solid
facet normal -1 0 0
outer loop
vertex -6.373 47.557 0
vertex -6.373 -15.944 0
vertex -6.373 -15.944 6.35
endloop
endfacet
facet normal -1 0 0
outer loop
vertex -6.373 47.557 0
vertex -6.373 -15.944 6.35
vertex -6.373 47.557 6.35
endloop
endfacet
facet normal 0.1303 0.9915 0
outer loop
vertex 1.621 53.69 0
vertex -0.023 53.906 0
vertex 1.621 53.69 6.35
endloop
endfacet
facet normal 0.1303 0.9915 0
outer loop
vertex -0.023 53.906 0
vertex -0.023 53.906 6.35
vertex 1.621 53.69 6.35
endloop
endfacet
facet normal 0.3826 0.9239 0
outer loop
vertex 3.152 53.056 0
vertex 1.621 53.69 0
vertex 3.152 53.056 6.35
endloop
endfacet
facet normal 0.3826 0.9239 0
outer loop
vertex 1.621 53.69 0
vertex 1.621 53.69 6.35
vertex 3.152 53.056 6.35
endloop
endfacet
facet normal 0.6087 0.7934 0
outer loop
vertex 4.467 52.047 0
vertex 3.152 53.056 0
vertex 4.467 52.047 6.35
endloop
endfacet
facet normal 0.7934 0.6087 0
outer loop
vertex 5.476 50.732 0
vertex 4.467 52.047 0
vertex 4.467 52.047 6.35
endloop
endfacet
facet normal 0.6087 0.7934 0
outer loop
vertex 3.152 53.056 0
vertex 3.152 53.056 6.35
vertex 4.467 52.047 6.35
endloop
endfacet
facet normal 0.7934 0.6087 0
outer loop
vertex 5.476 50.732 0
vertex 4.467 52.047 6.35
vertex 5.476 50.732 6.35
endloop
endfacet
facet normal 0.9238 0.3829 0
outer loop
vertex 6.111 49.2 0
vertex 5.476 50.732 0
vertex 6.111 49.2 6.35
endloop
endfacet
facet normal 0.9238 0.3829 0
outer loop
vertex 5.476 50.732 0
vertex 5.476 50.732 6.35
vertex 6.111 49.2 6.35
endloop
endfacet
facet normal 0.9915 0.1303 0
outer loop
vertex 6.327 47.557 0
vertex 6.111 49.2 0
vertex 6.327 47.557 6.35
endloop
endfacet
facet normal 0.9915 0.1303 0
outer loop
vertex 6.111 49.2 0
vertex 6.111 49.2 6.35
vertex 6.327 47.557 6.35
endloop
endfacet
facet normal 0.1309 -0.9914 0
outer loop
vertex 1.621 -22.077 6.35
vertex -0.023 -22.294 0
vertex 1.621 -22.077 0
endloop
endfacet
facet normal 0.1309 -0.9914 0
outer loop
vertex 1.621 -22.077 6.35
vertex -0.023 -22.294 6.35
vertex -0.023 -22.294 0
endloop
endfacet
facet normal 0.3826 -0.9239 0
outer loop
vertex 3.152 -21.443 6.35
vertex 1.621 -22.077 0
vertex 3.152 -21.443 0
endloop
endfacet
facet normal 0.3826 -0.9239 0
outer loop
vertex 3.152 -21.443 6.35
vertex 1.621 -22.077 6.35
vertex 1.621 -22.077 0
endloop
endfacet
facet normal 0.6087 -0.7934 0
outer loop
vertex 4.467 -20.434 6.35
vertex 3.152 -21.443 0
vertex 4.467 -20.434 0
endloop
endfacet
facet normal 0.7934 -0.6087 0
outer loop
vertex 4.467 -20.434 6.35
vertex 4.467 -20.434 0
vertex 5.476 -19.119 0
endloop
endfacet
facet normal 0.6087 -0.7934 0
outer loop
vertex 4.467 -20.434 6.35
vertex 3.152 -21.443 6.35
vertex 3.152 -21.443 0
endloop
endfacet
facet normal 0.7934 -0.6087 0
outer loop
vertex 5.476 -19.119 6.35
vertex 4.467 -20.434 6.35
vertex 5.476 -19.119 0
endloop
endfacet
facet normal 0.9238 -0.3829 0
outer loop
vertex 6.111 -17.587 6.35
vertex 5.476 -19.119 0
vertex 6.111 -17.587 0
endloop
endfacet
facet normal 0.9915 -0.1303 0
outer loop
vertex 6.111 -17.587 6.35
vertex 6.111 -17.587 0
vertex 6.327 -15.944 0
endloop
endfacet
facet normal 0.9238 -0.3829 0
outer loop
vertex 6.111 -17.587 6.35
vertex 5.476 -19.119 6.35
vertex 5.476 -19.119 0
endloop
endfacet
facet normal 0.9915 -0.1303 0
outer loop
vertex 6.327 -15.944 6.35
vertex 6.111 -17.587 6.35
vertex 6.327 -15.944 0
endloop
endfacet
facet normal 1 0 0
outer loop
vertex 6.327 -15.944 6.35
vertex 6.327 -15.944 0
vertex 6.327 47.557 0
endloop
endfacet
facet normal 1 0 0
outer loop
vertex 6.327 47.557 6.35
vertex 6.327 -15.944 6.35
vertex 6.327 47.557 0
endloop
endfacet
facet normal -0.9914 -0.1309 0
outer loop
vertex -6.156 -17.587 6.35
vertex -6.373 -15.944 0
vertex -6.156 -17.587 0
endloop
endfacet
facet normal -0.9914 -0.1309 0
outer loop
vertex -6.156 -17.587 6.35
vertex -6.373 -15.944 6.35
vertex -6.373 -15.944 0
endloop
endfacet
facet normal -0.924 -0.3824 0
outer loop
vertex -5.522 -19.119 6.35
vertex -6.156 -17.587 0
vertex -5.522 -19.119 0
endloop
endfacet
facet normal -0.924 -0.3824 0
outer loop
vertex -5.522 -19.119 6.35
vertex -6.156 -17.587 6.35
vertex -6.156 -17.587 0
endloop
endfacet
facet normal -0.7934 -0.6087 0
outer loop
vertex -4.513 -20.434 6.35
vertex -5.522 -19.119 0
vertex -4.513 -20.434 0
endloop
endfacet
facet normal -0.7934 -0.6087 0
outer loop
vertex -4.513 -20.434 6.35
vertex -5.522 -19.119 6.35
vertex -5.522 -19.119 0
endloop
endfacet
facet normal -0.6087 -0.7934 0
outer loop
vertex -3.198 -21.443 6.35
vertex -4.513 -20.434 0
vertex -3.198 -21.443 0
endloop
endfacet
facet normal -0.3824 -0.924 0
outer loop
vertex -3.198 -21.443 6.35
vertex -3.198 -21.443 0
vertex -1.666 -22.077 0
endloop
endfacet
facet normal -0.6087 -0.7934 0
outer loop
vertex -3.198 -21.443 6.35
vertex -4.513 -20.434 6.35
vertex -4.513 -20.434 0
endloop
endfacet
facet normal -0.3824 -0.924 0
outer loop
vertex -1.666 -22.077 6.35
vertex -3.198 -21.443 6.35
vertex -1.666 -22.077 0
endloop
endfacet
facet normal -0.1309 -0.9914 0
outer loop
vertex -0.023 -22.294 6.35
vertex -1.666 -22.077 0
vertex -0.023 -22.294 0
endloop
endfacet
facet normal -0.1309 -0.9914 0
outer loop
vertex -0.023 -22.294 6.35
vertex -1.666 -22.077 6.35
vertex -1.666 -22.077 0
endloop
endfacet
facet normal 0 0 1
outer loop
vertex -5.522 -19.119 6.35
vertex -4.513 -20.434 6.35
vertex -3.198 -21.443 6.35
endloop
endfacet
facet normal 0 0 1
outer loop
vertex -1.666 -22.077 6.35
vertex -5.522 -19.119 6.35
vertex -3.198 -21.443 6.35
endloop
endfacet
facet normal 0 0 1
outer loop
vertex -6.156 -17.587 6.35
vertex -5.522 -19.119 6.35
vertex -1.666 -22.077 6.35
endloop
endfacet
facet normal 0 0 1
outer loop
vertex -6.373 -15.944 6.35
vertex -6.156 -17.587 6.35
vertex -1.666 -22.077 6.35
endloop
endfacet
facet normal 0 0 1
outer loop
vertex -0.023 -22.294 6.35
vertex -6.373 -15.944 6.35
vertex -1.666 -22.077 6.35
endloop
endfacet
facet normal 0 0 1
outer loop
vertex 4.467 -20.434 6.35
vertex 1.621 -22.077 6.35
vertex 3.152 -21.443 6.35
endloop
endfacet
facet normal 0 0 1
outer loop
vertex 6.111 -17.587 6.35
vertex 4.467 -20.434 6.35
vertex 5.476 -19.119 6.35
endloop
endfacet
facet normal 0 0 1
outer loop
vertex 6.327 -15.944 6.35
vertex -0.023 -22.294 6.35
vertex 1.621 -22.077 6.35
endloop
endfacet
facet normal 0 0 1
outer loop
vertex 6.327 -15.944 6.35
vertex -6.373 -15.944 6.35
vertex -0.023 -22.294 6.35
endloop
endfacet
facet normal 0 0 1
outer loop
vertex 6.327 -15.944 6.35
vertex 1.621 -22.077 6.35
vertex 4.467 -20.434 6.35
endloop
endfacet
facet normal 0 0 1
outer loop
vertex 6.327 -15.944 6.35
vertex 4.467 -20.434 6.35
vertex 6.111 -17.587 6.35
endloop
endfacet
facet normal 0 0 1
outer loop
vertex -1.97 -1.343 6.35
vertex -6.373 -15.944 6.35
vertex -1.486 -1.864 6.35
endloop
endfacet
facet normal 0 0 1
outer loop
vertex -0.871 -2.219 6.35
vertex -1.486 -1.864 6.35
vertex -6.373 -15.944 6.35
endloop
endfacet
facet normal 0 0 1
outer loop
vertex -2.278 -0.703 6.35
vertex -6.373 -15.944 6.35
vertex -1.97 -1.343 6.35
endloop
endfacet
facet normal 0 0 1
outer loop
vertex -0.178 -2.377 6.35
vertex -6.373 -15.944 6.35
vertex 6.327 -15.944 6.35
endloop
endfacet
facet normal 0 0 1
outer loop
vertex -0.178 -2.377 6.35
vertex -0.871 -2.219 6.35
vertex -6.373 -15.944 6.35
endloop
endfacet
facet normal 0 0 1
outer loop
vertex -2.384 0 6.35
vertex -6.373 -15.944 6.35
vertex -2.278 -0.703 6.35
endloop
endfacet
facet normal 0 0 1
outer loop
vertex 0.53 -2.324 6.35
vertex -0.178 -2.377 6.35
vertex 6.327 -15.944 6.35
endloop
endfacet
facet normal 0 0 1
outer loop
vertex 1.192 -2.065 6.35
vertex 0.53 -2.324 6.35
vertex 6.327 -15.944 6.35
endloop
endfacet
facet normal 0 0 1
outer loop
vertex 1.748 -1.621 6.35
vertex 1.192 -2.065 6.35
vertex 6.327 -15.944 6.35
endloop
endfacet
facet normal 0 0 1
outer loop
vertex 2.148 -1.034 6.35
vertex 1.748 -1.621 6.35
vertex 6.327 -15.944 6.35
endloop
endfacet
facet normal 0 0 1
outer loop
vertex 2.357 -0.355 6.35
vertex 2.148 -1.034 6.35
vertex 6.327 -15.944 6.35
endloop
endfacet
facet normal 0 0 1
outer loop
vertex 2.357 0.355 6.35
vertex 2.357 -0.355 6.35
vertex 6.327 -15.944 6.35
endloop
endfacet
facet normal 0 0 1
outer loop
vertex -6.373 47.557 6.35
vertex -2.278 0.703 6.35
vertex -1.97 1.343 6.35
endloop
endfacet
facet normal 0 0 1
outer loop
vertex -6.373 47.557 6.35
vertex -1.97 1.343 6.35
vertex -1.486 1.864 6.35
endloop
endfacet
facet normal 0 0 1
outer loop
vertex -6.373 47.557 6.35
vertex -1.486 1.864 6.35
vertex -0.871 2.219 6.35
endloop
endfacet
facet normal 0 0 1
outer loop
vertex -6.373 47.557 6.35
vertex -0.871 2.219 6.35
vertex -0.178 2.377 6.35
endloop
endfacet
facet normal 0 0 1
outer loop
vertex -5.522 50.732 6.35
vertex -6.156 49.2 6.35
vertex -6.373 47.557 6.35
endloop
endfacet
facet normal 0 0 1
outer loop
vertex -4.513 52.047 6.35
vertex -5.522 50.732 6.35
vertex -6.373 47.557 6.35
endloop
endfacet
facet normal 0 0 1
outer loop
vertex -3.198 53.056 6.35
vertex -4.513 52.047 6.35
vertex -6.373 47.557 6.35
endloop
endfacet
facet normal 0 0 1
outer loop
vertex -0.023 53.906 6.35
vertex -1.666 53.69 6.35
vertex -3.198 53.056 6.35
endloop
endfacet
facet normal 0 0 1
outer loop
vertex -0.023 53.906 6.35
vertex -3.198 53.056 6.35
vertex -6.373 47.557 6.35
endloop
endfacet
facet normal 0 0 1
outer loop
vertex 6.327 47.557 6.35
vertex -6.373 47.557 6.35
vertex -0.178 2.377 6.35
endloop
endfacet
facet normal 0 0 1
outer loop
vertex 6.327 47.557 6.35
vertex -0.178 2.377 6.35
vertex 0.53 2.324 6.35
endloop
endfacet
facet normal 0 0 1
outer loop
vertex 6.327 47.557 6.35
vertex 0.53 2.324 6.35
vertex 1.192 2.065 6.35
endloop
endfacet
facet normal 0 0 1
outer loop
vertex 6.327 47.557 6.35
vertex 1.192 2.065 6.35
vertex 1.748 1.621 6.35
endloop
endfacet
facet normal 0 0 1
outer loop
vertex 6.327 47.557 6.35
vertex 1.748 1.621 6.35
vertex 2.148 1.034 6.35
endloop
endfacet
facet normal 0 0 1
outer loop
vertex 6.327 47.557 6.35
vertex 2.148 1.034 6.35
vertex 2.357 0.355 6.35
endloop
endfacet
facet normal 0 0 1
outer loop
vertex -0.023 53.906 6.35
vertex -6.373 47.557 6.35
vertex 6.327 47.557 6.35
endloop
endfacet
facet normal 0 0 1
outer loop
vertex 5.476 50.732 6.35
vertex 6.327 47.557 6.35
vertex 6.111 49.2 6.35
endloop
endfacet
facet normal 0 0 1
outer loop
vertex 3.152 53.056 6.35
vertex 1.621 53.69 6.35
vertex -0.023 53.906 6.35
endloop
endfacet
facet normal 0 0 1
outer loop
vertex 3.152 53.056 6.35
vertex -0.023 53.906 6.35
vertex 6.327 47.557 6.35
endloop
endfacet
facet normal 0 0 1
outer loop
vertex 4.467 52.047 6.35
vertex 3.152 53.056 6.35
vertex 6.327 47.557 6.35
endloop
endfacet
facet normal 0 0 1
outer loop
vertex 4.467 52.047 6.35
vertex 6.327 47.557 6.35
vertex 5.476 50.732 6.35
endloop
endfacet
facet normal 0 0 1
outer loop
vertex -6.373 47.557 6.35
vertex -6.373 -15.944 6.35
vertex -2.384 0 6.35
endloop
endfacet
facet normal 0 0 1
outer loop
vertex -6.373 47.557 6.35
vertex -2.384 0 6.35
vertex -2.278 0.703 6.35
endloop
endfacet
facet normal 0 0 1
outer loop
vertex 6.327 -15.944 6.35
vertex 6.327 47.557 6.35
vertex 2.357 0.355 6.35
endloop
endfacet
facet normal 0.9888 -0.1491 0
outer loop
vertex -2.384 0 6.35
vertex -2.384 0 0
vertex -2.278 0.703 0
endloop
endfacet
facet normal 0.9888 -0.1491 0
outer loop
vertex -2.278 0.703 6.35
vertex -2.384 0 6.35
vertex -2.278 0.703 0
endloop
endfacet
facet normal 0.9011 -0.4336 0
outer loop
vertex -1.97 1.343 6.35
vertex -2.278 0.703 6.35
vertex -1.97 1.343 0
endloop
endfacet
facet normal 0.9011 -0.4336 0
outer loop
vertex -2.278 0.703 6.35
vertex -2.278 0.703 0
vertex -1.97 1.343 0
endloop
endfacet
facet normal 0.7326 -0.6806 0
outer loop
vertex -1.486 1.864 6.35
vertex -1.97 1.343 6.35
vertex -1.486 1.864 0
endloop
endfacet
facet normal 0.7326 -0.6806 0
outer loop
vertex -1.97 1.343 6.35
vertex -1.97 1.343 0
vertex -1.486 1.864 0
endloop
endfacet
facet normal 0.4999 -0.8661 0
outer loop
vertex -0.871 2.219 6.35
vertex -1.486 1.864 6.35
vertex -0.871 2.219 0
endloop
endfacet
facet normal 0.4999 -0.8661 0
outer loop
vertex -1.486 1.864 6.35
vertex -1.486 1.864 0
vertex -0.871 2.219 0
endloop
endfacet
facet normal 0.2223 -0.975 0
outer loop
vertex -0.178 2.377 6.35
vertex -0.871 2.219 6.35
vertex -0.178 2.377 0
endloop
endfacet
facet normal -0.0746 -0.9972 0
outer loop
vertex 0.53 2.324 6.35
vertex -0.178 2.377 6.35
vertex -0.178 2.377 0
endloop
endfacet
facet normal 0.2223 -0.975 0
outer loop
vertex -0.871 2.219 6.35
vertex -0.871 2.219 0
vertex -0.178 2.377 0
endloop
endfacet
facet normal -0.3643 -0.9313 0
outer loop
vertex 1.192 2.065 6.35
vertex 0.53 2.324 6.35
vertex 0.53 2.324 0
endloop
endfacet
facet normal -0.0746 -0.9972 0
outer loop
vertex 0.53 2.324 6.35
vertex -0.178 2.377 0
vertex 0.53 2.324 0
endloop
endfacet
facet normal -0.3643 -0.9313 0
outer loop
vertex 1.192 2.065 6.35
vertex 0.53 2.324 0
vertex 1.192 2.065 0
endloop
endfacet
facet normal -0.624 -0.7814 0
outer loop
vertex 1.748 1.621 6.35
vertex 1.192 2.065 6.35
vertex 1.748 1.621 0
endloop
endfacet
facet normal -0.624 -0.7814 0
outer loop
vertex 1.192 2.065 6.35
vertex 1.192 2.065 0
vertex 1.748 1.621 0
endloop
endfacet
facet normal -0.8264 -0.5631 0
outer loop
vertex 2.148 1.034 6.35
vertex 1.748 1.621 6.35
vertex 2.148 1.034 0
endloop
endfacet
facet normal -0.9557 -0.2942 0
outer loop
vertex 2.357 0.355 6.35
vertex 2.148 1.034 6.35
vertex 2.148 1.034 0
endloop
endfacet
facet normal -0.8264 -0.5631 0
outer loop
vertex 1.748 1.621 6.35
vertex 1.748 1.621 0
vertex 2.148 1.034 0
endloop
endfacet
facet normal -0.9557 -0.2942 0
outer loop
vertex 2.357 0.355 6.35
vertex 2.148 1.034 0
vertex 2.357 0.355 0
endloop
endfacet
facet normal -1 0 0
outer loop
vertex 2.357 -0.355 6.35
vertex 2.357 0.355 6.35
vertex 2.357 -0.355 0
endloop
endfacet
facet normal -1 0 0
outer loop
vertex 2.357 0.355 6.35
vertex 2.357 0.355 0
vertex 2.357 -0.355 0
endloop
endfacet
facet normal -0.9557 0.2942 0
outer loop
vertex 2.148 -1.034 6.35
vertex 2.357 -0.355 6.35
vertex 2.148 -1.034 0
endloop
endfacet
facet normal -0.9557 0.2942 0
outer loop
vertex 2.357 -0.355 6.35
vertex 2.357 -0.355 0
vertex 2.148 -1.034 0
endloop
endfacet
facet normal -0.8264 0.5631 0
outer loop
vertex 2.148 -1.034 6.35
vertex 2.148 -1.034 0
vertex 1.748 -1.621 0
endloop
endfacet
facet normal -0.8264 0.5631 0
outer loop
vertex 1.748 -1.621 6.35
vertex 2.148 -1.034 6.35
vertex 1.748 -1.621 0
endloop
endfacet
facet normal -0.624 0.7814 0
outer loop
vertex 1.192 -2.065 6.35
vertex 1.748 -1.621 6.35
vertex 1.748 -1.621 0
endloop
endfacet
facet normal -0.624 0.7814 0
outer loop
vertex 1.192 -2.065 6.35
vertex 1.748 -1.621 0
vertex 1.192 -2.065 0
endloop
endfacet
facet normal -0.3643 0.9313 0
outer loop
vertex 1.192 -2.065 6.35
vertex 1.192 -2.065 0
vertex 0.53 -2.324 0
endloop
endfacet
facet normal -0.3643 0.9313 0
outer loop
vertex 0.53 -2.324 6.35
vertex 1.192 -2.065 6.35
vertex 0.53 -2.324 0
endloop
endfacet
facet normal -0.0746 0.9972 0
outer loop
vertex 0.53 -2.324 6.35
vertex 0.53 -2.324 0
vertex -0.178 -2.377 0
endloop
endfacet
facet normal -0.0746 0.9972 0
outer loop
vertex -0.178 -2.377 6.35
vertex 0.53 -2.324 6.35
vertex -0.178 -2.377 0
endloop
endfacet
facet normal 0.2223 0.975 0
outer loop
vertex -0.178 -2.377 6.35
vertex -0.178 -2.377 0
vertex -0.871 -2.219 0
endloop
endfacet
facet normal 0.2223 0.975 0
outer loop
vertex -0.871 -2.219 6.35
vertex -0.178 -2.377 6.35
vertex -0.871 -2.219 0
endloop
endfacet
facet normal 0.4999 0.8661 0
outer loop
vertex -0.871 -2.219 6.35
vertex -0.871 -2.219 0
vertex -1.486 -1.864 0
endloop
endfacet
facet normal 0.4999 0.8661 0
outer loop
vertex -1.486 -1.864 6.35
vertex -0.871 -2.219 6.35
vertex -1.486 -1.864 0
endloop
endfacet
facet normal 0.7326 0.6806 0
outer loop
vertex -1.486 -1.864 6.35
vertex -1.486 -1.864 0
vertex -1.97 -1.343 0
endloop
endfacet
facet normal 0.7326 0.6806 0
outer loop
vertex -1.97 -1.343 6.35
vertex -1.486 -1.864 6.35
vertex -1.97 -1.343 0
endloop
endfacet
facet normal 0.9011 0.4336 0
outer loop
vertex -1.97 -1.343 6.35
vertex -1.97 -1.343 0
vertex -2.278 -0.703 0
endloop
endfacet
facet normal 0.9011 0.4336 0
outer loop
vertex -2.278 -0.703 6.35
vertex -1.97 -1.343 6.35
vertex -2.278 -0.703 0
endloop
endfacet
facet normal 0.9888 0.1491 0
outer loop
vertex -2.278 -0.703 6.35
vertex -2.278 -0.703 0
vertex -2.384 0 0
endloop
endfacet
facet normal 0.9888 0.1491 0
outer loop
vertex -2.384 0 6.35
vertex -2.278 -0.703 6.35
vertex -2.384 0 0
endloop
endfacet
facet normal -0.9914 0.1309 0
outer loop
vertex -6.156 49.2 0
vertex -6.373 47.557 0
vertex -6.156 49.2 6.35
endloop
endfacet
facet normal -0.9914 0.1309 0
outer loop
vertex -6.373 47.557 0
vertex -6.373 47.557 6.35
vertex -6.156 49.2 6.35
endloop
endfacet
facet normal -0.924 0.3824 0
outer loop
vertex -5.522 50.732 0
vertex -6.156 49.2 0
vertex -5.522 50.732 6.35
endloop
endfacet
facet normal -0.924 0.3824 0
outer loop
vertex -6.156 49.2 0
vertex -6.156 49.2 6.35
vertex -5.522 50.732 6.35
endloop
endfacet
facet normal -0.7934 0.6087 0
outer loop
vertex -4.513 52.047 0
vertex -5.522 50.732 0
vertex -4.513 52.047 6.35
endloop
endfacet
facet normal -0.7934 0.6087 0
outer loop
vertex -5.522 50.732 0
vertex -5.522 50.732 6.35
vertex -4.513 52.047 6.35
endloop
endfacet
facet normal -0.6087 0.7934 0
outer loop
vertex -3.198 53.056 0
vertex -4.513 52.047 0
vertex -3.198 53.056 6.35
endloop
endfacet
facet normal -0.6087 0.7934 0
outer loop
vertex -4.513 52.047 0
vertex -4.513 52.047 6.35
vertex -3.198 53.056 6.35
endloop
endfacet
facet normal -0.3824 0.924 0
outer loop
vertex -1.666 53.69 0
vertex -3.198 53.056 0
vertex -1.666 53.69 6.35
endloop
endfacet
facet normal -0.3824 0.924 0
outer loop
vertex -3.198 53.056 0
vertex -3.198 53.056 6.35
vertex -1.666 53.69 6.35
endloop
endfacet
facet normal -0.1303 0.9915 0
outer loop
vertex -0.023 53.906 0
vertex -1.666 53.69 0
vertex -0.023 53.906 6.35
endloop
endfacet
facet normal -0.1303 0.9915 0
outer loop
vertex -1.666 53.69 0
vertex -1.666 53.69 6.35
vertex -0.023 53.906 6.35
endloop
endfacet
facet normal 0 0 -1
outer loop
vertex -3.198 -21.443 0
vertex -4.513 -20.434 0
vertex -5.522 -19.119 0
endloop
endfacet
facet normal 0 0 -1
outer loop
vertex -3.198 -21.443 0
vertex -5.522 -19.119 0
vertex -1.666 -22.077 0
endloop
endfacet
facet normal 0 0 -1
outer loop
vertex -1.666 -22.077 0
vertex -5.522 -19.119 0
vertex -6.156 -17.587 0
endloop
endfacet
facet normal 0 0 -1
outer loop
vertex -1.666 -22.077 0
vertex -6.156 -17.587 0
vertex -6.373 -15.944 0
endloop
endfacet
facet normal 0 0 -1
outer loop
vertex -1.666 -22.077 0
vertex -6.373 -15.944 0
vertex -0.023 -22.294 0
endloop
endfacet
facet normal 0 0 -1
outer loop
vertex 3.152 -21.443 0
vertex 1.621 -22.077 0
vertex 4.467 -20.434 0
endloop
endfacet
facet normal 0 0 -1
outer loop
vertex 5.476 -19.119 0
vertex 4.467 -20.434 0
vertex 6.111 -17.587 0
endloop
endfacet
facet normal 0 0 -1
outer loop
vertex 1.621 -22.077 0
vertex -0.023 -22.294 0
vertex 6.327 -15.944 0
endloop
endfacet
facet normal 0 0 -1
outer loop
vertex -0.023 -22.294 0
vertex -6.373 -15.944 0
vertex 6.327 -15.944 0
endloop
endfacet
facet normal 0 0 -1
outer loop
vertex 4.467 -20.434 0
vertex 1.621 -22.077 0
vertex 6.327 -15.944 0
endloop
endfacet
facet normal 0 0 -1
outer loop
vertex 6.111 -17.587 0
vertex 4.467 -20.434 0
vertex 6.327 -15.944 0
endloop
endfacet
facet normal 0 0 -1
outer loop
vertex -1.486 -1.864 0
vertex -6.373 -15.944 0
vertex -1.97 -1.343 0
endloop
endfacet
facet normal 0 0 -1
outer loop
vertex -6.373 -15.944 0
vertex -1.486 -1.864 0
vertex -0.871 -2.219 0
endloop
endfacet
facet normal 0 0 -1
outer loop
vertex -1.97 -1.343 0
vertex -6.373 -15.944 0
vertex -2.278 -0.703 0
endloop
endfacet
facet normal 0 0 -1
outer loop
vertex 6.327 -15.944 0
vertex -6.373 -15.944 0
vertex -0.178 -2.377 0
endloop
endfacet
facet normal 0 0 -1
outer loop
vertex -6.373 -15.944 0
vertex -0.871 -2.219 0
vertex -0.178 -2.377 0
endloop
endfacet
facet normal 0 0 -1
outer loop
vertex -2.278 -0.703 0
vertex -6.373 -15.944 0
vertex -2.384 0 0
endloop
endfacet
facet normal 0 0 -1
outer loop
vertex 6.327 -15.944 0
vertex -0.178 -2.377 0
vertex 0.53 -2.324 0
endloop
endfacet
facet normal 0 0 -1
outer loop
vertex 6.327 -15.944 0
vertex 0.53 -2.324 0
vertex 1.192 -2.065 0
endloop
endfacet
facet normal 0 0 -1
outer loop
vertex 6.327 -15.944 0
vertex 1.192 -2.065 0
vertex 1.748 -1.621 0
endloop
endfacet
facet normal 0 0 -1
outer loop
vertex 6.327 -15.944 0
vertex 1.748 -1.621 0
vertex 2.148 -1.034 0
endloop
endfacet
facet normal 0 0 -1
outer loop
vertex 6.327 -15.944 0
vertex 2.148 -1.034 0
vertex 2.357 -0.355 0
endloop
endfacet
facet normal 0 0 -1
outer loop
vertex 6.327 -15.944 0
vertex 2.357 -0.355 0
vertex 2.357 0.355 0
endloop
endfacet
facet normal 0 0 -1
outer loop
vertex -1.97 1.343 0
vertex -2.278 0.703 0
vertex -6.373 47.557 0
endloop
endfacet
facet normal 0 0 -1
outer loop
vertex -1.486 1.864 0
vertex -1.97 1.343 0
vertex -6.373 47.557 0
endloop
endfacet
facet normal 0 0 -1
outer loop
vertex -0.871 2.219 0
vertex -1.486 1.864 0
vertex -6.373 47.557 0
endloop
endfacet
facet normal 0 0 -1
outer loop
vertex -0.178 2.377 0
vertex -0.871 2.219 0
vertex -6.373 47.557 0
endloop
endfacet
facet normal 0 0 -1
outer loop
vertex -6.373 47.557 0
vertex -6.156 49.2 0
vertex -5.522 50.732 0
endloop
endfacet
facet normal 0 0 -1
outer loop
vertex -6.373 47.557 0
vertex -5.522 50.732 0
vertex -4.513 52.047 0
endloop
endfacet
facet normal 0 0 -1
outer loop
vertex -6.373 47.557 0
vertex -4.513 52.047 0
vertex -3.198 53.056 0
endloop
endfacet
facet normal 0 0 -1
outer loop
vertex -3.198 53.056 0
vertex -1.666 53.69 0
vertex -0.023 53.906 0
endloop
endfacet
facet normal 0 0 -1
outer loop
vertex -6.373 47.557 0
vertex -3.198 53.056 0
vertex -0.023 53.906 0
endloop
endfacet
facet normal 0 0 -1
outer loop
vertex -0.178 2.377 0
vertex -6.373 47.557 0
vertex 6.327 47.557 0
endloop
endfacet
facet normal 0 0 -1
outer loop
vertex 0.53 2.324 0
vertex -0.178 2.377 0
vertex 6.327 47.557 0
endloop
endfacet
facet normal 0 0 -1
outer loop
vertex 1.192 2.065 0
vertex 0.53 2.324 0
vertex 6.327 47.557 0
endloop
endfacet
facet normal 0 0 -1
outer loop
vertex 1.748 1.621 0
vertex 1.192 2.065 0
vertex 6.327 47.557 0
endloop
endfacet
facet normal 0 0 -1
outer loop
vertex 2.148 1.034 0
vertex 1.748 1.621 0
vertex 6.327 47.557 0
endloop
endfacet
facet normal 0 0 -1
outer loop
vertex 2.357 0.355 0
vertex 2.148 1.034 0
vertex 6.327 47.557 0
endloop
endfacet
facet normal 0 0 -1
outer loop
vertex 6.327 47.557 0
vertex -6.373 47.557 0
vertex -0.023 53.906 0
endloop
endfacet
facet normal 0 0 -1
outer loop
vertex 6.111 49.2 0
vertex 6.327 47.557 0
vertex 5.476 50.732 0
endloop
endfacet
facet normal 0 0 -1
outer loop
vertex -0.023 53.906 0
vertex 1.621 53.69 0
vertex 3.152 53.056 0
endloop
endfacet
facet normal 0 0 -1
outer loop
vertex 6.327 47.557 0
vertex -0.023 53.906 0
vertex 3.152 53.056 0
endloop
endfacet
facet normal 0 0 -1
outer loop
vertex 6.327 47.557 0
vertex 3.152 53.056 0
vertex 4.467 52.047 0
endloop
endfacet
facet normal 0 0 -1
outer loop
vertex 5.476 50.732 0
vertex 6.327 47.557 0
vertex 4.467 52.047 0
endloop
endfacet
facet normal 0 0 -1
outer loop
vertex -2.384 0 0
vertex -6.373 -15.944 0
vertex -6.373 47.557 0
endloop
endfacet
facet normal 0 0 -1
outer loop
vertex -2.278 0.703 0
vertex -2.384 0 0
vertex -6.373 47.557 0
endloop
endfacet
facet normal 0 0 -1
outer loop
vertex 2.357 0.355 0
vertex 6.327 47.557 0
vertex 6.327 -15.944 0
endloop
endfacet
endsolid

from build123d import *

# Parameters (mm, degrees)
SKETCH1_W           = 12.7
SKETCH1_H           = 76.2
BOSS_EXTRUDE1_DEPTH = 6.35
SKETCH2_R           = 2.383900133
CUT_EXTRUDE1_DEPTH  = 55.651998855
FILLET1_R           = 6.35


with BuildPart() as part:
    # Sketch1 → Boss-Extrude1 (new body)
    with BuildSketch(Plane.XY):
        with Locations((-0.022814859, 15.806453321)):
            Rectangle(SKETCH1_W, SKETCH1_H)
    extrude(amount=BOSS_EXTRUDE1_DEPTH)

    # Sketch2 → Cut-Extrude1 (cut, through all)
    with BuildSketch(Plane(origin=(0, 0, 0), x_dir=(-1, 0, 0), z_dir=(0, 0, -1))):
        Circle(SKETCH2_R)
    extrude(amount=-CUT_EXTRUDE1_DEPTH, mode=Mode.SUBTRACT)

    # Fillet1
    fillet1_edges = [part.edges().sort_by_distance(p)[0] for p in [
        (6.327185141, -22.293546679, 3.175),
        (-6.372814859, -22.293546679, 3.175),
        (6.327185141, 53.906453321, 3.175),
        (-6.372814859, 53.906453321, 3.175),
    ]]
    fillet(fillet1_edges, radius=FILLET1_R - 0.0001)  # a hair under: the kernel refuses the full size


solid = part.part
